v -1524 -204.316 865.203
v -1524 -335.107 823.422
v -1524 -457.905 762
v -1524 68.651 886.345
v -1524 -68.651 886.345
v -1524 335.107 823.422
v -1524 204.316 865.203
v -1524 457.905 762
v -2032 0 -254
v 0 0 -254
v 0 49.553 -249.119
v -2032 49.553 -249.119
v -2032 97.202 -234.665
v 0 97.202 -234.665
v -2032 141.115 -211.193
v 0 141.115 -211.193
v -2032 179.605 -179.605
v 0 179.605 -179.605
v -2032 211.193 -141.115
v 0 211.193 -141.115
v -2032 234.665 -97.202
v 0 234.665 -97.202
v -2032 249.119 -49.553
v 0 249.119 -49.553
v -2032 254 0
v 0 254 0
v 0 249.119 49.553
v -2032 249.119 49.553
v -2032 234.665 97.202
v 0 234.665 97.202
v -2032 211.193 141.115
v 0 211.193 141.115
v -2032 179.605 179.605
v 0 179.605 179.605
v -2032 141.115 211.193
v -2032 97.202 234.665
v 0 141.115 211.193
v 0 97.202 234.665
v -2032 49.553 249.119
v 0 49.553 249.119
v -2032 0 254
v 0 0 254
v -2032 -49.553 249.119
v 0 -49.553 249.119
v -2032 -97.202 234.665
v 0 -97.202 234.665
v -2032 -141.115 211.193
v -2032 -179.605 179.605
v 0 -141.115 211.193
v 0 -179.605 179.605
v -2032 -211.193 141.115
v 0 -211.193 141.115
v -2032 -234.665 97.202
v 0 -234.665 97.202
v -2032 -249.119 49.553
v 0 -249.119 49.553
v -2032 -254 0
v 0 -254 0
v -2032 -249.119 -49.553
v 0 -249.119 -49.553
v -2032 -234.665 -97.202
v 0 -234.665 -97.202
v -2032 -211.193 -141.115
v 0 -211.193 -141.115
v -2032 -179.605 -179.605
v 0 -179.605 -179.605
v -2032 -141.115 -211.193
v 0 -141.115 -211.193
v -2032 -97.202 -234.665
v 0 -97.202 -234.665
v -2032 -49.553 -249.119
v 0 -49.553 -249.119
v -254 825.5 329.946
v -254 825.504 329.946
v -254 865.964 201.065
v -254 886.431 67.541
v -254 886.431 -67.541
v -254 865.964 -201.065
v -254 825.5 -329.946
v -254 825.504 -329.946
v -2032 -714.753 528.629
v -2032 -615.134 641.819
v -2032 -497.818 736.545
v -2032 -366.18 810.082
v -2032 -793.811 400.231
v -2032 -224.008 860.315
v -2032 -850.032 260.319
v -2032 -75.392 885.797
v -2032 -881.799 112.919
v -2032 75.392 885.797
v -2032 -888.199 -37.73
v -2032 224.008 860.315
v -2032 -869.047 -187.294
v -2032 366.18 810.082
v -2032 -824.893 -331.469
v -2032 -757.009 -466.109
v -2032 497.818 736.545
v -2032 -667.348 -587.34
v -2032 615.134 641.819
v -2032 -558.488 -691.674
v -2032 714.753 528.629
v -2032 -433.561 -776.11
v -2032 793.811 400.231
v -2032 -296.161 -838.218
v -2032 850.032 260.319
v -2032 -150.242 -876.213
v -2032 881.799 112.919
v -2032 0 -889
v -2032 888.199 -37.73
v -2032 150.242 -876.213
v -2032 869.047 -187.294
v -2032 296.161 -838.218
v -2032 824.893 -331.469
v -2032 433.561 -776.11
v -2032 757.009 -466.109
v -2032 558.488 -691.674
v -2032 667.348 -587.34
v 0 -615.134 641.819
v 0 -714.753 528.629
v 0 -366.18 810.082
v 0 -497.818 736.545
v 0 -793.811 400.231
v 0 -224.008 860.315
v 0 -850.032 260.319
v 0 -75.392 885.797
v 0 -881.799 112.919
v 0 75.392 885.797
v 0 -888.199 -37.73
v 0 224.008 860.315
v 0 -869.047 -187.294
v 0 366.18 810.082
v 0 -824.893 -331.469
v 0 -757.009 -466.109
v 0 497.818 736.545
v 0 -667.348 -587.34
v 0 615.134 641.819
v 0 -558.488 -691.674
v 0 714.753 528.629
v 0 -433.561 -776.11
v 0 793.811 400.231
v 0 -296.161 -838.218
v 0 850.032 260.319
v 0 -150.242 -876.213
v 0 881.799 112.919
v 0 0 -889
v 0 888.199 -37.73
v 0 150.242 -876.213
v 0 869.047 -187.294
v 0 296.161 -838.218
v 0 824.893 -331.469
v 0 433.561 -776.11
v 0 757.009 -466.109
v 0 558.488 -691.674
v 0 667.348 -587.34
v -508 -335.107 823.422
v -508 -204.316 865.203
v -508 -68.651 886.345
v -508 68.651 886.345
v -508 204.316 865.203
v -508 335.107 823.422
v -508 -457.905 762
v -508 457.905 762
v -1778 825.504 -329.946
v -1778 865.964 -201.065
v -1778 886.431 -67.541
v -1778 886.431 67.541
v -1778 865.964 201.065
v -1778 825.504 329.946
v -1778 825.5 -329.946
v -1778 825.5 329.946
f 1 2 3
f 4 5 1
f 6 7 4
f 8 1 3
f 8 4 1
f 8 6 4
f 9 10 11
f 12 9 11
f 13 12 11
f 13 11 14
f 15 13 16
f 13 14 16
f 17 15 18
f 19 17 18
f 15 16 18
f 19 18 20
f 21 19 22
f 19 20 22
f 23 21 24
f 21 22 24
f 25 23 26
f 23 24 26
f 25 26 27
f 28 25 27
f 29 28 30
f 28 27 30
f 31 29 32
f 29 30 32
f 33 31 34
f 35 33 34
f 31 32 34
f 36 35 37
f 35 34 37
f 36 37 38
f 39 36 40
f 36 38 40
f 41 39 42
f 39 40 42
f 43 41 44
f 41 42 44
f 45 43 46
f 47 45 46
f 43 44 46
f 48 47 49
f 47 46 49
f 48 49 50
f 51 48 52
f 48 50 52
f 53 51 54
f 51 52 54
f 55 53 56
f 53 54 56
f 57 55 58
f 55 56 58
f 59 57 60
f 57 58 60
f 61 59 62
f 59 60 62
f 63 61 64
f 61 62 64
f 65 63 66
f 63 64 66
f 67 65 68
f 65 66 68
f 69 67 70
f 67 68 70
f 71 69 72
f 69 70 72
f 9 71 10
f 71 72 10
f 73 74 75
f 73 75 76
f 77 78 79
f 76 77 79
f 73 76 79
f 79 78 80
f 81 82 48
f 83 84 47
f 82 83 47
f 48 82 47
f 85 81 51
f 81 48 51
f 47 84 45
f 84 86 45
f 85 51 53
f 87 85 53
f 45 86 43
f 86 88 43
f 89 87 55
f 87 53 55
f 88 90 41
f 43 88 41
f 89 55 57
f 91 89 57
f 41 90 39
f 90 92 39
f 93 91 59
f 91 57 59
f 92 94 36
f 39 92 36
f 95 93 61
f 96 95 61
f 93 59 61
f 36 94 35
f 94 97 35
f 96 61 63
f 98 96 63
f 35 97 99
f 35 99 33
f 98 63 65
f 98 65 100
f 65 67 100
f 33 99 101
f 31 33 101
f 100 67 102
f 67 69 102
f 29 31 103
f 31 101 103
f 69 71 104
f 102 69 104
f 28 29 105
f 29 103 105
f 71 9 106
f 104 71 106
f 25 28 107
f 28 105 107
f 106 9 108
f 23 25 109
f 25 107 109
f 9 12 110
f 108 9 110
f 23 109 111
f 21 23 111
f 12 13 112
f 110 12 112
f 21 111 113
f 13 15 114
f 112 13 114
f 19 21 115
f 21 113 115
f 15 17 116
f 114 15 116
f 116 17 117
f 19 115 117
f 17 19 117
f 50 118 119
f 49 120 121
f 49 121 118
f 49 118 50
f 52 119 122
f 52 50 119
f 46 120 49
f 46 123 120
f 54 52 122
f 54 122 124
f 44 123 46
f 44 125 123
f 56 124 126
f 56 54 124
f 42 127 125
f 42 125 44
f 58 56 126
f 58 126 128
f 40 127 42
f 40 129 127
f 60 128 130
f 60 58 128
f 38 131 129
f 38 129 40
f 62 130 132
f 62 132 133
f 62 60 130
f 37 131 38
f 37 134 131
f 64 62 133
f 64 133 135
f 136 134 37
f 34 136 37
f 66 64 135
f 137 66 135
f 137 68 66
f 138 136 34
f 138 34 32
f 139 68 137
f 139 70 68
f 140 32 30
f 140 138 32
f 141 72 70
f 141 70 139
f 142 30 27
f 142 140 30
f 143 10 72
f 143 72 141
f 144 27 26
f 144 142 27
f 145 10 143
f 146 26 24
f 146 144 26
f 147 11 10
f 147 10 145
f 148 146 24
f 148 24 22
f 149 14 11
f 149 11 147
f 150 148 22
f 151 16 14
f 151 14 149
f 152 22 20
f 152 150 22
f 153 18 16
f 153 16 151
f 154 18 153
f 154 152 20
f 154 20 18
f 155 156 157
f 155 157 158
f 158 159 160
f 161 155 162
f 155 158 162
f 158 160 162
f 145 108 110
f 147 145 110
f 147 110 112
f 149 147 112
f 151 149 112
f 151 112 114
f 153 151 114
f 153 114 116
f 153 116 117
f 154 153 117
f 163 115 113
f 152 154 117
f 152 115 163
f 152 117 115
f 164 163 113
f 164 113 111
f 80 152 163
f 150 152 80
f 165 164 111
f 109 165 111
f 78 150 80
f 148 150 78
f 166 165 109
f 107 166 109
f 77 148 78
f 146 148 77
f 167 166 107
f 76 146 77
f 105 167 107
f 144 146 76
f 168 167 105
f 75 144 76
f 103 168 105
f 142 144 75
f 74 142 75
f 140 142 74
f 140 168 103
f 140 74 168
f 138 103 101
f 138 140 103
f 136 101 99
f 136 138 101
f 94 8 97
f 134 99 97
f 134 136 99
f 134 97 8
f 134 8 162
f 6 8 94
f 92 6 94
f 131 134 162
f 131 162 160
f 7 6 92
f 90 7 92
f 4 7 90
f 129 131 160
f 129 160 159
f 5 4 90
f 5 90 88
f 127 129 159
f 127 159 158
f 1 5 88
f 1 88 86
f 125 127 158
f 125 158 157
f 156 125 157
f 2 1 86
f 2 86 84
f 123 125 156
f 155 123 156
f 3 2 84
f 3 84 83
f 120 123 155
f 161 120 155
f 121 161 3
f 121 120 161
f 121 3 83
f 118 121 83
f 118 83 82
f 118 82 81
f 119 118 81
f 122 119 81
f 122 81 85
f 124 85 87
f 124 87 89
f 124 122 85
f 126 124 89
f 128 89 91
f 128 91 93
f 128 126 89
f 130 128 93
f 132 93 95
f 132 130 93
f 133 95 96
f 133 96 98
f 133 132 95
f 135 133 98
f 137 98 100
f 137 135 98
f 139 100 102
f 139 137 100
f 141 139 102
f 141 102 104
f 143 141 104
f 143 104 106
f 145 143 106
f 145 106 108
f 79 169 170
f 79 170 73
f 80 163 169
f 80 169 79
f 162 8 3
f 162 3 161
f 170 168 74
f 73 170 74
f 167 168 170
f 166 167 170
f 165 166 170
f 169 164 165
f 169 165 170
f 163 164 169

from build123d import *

# Parameters (mm, degrees)
SKETCH1_R           = 889
SKETCH1_R_2         = 254
BOSS_EXTRUDE1_DEPTH = 2032
SKETCH2_W           = 1016
SKETCH2_H           = 915.924
CUT_EXTRUDE1_DEPTH  = 127
SKETCH3_W           = 1524
SKETCH3_H           = 659.892
CUT_EXTRUDE2_DEPTH  = 63.5


with BuildPart() as part:
    # Sketch1 → Boss-Extrude1 (new body)
    with BuildSketch(Plane(origin=(0, 0, 0), x_dir=(0, 0, -1), z_dir=(1, 0, 0))):
        Circle(SKETCH1_R)
        Circle(SKETCH1_R_2, mode=Mode.SUBTRACT)
    extrude(amount=-BOSS_EXTRUDE1_DEPTH)

    # Sketch2 → Cut-Extrude1 (cut)
    with BuildSketch(Plane.XY.offset(889)):
        with Locations((-1016, 0)):
            Rectangle(SKETCH2_W, SKETCH2_H)
    extrude(amount=-CUT_EXTRUDE1_DEPTH, mode=Mode.SUBTRACT)

    # Sketch3 → Cut-Extrude2 (cut)
    with BuildSketch(Plane(origin=(0, 889, 0), x_dir=(1, 0, 0), z_dir=(0, 1, 0))):
        with Locations((-1016, 0)):
            Rectangle(SKETCH3_W, SKETCH3_H)
    extrude(amount=-CUT_EXTRUDE2_DEPTH, mode=Mode.SUBTRACT)


solid = part.part
